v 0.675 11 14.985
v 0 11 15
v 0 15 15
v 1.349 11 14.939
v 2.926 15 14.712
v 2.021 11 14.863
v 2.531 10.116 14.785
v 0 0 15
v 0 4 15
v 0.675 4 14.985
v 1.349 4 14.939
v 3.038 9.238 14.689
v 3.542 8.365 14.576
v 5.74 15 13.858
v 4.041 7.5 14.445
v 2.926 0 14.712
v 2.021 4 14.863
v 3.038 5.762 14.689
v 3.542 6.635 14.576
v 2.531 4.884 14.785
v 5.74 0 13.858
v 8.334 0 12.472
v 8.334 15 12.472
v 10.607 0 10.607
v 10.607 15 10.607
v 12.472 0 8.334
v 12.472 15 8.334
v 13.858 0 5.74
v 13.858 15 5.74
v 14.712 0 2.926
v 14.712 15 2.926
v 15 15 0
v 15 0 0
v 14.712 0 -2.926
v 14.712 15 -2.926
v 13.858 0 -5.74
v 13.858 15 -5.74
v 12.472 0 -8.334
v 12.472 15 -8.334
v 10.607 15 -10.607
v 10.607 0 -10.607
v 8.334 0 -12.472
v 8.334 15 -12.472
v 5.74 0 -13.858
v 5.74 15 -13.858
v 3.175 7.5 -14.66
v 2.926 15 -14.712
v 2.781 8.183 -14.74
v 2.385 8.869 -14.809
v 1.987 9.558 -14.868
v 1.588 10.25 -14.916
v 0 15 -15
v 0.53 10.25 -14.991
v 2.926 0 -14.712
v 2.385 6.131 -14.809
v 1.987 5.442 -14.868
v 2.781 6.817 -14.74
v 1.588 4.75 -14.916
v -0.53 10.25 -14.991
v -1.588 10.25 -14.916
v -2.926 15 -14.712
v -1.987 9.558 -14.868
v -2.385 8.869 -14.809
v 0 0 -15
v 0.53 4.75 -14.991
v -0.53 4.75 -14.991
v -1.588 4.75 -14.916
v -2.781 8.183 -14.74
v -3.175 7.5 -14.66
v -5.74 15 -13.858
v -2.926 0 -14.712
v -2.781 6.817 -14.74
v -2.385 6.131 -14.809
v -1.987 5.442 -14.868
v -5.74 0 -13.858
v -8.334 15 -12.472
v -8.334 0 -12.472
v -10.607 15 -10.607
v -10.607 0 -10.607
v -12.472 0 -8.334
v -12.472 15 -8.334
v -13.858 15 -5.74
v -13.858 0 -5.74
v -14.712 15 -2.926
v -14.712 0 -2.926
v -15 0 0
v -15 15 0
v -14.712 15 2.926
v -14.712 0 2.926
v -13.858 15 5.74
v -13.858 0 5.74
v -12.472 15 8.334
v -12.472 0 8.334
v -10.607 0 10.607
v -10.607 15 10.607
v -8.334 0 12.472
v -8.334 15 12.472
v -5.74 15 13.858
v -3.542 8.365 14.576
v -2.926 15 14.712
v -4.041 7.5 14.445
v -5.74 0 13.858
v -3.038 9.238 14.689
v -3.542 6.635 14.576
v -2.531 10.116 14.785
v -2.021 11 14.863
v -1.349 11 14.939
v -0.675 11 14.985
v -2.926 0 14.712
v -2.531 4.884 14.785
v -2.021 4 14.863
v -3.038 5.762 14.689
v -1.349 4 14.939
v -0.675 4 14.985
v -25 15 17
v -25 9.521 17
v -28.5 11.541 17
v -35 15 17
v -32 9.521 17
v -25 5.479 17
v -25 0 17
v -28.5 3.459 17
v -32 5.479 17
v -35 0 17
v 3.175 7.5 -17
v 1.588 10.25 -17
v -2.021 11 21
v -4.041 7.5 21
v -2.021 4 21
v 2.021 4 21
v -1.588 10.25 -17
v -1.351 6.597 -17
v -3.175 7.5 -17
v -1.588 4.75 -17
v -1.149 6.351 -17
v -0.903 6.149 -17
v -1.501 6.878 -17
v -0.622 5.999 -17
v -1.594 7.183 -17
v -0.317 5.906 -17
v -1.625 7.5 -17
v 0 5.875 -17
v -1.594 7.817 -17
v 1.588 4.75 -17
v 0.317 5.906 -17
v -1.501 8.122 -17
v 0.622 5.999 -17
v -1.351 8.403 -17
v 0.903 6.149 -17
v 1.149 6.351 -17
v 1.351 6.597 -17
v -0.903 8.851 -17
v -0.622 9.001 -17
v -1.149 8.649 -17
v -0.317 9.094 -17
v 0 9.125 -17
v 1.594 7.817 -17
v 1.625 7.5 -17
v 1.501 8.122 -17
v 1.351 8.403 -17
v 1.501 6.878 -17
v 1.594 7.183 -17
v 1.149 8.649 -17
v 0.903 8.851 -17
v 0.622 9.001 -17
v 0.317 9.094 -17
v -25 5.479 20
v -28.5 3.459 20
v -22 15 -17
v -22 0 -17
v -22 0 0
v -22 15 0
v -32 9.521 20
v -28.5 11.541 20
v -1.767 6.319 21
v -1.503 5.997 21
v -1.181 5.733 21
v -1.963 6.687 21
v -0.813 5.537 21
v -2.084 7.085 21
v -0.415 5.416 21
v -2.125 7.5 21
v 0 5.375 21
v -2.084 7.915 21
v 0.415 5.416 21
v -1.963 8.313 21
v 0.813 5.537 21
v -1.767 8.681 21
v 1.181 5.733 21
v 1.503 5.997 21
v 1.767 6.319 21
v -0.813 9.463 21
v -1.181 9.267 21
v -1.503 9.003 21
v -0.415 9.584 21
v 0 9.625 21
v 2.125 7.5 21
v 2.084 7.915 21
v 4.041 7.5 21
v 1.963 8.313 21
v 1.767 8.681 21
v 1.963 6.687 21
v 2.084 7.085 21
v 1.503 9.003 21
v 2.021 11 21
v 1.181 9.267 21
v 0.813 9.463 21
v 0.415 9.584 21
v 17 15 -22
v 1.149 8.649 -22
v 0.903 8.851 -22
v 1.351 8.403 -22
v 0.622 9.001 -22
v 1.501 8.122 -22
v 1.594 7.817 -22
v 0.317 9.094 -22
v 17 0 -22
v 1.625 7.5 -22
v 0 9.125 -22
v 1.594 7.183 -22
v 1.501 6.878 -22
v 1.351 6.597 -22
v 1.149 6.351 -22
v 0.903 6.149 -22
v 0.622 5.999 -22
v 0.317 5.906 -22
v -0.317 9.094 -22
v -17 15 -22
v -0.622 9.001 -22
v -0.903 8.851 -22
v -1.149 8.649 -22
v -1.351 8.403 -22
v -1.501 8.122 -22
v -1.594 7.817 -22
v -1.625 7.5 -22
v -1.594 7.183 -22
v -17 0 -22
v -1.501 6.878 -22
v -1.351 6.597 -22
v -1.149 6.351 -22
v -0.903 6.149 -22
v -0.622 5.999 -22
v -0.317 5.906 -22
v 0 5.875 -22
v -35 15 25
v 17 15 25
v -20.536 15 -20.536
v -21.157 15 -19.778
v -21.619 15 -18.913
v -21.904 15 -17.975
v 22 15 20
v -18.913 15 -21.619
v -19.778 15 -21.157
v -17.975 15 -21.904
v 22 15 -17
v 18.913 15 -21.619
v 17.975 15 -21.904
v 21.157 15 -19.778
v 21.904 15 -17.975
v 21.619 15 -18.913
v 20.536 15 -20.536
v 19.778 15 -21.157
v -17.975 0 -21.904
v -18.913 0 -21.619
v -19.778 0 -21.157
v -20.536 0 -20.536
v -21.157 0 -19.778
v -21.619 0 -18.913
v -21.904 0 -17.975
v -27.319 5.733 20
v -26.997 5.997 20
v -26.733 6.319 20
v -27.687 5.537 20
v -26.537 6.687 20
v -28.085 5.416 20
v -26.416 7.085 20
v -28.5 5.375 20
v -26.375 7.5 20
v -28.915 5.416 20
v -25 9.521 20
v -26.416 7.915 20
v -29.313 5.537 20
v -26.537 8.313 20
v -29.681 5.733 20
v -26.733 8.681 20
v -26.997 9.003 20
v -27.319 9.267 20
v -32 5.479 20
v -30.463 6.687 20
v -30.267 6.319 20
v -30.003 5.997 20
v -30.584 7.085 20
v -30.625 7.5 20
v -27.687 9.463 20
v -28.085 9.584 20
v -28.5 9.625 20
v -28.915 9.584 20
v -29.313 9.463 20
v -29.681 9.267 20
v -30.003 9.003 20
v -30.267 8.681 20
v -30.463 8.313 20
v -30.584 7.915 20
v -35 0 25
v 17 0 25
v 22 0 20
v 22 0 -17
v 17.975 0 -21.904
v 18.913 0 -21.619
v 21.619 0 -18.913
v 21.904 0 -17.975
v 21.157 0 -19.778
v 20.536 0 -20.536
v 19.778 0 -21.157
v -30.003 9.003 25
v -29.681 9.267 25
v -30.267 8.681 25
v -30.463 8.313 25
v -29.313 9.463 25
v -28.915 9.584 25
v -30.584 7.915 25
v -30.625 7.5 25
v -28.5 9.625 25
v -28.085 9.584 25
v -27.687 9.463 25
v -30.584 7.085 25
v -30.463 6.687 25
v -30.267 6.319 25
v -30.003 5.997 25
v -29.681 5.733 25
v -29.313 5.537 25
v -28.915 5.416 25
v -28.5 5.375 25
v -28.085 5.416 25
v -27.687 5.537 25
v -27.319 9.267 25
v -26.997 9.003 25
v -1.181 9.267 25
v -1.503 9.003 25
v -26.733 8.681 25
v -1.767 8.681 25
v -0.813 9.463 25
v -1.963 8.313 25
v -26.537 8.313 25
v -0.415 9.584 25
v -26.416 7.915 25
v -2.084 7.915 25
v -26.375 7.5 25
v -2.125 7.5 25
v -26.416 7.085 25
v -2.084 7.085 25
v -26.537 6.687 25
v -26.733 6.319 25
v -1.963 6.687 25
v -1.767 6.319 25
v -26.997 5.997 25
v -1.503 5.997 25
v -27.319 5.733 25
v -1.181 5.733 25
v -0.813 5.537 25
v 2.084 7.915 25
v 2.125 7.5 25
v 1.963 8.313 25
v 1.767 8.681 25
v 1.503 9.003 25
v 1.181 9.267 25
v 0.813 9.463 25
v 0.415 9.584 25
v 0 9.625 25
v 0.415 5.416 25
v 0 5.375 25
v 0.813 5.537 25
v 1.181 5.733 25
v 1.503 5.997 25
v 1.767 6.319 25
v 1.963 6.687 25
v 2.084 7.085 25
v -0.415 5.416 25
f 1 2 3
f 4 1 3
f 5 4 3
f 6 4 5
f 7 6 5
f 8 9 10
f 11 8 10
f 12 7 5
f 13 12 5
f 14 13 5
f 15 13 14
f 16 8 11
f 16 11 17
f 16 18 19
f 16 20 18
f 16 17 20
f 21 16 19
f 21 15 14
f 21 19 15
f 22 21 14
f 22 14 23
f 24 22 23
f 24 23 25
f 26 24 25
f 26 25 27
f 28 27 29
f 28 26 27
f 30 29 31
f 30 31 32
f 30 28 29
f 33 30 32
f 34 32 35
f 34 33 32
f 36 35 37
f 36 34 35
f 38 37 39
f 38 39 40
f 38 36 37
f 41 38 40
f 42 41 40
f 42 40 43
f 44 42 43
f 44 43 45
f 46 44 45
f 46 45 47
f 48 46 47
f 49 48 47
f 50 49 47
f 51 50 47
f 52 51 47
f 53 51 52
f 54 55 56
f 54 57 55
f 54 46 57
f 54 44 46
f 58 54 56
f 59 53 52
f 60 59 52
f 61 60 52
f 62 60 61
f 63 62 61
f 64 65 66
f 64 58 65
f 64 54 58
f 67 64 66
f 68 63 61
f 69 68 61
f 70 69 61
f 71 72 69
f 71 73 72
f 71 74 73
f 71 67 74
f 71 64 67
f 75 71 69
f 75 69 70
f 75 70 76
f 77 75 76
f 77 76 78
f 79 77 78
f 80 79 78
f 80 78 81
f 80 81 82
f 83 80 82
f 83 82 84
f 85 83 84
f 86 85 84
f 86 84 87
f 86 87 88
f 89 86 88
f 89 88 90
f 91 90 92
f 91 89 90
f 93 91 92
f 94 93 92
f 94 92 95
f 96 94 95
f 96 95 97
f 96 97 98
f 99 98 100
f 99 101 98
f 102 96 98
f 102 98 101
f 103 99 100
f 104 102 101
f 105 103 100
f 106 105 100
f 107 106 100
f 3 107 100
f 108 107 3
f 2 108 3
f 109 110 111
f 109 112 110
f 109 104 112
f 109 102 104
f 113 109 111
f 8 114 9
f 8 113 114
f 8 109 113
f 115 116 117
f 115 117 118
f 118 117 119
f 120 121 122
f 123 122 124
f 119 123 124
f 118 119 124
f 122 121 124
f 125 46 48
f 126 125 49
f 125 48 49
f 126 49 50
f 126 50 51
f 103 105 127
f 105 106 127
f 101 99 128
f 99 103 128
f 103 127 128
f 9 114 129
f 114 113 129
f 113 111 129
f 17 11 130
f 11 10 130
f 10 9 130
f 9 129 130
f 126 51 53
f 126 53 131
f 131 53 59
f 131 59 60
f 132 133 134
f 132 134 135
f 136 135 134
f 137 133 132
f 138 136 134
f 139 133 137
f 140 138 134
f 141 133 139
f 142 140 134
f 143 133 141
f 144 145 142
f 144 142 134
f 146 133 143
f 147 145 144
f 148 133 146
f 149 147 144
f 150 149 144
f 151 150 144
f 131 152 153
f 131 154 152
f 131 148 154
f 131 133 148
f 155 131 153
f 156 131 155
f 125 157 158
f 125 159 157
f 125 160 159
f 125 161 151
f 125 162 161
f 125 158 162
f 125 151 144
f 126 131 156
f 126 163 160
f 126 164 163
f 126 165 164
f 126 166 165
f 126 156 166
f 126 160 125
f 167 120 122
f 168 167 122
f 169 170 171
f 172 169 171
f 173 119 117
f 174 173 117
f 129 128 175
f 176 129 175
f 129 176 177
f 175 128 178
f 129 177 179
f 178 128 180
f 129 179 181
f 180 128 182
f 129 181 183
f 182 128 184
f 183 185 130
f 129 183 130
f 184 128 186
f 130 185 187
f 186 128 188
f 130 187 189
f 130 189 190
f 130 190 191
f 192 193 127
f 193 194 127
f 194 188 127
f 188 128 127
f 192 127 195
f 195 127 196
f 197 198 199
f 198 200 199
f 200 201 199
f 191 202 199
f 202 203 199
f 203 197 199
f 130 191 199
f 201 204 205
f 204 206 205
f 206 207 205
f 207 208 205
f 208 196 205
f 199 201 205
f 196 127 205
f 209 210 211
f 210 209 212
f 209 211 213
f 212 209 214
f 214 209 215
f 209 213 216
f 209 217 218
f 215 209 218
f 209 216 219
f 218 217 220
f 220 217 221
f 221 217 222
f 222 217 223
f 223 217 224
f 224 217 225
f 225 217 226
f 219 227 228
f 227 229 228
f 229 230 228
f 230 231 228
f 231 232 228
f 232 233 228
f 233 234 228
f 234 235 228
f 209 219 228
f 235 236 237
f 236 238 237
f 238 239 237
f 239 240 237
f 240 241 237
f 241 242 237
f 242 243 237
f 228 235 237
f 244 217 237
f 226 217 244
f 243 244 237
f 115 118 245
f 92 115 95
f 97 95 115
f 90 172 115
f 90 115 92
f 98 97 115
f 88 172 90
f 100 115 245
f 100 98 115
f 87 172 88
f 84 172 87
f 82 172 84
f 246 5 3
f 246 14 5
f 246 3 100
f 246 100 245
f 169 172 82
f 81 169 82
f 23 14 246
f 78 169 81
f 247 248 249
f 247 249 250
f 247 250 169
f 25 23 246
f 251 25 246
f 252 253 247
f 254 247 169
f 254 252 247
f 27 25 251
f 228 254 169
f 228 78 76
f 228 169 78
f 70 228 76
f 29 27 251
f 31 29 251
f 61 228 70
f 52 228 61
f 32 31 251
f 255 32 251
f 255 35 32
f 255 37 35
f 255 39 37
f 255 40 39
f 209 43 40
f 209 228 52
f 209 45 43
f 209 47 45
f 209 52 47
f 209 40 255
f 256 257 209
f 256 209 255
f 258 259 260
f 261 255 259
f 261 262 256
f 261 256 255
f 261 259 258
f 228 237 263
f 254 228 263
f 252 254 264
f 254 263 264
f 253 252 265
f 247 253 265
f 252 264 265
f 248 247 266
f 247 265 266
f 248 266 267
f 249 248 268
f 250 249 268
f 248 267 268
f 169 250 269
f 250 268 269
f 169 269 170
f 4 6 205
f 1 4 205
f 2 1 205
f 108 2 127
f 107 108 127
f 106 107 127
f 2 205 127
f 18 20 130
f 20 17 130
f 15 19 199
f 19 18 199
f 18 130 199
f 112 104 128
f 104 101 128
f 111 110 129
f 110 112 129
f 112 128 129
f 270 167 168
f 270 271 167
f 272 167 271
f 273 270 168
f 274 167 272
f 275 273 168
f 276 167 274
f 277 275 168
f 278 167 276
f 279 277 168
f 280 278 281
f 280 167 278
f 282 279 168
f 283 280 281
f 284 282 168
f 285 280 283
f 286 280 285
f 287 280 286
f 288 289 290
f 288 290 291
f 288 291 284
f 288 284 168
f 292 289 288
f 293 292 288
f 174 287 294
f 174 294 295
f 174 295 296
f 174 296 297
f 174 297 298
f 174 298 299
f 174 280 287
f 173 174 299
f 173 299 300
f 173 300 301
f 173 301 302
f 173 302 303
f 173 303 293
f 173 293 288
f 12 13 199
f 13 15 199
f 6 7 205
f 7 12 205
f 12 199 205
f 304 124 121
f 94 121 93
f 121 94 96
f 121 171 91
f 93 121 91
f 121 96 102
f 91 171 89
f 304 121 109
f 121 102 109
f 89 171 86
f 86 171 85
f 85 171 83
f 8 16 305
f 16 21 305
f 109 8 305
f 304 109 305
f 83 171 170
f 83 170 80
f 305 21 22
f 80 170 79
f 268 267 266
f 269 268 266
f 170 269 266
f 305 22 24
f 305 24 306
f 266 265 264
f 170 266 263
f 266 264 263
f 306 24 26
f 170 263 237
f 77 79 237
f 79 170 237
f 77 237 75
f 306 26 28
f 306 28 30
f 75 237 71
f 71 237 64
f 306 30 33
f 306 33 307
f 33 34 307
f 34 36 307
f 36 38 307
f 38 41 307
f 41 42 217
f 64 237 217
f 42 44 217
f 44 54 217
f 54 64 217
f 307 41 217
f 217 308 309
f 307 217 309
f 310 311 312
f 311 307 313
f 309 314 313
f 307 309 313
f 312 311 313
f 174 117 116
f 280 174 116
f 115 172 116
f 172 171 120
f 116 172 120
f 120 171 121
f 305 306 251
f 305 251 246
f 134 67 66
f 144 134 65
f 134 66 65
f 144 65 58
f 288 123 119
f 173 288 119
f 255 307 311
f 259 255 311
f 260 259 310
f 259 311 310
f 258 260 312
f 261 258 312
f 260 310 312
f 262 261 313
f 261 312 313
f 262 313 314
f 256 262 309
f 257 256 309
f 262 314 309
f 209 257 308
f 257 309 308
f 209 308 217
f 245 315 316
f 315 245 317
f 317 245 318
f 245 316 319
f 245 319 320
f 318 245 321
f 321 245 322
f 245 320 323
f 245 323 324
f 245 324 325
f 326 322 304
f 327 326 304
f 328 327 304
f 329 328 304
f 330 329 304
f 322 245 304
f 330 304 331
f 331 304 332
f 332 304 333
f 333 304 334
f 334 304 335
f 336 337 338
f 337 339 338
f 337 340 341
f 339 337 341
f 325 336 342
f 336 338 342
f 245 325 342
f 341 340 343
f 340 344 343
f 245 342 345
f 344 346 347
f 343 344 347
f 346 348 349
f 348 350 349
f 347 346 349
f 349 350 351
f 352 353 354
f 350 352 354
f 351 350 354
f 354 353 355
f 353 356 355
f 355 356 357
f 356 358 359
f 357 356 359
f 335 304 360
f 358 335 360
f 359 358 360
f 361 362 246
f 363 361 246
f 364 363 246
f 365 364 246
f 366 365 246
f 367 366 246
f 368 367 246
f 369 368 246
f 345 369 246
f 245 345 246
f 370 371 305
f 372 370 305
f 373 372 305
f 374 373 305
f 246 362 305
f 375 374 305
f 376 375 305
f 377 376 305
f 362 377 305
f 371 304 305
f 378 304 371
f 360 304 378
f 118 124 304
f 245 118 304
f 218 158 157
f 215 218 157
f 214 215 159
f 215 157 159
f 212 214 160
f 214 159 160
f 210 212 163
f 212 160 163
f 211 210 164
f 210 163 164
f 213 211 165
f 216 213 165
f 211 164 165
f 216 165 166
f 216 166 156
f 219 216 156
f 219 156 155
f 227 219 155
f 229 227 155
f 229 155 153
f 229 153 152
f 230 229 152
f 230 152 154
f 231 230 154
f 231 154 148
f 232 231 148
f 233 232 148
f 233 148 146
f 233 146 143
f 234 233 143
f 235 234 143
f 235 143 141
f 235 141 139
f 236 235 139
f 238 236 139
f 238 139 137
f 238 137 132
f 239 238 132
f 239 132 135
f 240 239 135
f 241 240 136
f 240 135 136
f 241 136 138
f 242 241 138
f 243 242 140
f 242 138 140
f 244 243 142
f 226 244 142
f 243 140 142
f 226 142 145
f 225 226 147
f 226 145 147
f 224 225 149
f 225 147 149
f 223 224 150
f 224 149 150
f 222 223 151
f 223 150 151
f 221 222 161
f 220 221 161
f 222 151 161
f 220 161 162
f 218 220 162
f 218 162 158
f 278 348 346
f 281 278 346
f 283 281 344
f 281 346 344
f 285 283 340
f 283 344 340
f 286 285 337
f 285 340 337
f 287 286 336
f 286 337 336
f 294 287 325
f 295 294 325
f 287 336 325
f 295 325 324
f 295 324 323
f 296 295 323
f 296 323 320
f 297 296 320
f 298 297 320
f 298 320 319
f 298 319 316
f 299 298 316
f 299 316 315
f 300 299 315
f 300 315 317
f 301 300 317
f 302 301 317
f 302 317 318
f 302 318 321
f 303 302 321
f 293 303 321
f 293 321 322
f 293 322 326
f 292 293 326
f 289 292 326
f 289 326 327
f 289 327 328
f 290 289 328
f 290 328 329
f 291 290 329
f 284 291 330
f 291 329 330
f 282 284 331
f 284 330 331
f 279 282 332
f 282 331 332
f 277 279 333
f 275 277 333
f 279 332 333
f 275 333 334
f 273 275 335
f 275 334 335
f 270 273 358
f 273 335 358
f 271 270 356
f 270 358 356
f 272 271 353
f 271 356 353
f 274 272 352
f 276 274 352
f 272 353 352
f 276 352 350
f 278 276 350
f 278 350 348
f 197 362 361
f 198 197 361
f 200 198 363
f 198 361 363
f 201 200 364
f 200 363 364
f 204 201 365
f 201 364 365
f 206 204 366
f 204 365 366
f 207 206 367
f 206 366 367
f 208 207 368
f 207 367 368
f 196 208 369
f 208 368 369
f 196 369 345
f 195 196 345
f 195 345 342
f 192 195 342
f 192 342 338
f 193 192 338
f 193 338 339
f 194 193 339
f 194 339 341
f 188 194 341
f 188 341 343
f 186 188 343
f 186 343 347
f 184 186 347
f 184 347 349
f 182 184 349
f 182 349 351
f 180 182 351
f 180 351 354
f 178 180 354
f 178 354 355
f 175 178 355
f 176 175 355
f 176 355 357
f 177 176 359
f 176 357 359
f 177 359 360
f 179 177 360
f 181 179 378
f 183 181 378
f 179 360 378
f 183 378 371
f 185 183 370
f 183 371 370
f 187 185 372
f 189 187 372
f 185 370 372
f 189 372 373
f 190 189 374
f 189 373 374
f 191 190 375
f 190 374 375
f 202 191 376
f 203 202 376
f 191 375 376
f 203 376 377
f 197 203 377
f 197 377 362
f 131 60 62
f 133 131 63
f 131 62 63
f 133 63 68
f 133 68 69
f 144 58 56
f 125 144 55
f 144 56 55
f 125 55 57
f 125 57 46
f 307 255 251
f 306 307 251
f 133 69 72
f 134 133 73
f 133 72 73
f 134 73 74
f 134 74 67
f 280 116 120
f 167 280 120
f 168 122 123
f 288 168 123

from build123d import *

# Parameters (mm, degrees)
CROQUIS1_R              = 15
SALIENTE_EXTRUIR1_DEPTH = 15
CORTAR_EXTRUIR1_REACH   = 62.49
CROQUIS2_R              = 2.125
CORTAR_EXTRUIR2_DEPTH   = 3
CUT_EXTRUDE1_DEPTH      = 46.552167984
CUT_EXTRUDE2_REACH      = 66.49
CUT_EXTRUDE2_END_RADIUS = 15
CUT_EXTRUDE2_START      = -4
CUT_EXTRUDE3_START      = -39
CUT_EXTRUDE3_DEPTH      = 3
BOSS_EXTRUDE3_START     = -15
BOSS_EXTRUDE3_DEPTH     = 15
CUT_EXTRUDE4_START      = -20
SKETCH4_R               = 1.625
CUT_EXTRUDE4_DEPTH      = 41.489668539


with BuildPart() as part:
    # Croquis1 → Saliente-Extruir1 (new body)
    with BuildSketch(Plane(origin=(0, 0, 0), x_dir=(1, 0, 0), z_dir=(0, 1, 0))):
        with BuildLine():
            Line((-35, -17), (-35, -25))
            Line((-35, -25), (35, -25))
            Line((35, -25), (35, -17))
            Line((35, -17), (25, -17))
            Line((25, -17), (22, 0))
            ThreePointArc((22, 0), (0, 22), (-22, 0))
            Line((-22, 0), (-25, -17))
            Line((-25, -17), (-35, -17))
        make_face()
        with Locations(Location((0, 0, 0), (0, 0, 270))):
            Circle(CROQUIS1_R, mode=Mode.SUBTRACT)
    extrude(amount=SALIENTE_EXTRUIR1_DEPTH)

    # Croquis2 → Cortar-Extruir1 (cut, up to next)
    with BuildSketch(Plane.XY.offset(25), mode=Mode.PRIVATE) as cortar_extruir1_sk1:
        with Locations((-28.5, 7.5)):
            Circle(CROQUIS2_R)
    cortar_extruir1_tool1 = extrude(cortar_extruir1_sk1.sketch, amount=-CORTAR_EXTRUIR1_REACH, mode=Mode.PRIVATE) & part.part
    # Croquis2 → Cortar-Extruir1 (cut, up to next)
    with BuildSketch(Plane.XY.offset(25), mode=Mode.PRIVATE) as cortar_extruir1_sk2:
        with Locations((28.5, 7.5)):
            Circle(CROQUIS2_R)
    cortar_extruir1_tool2 = extrude(cortar_extruir1_sk2.sketch, amount=-CORTAR_EXTRUIR1_REACH, mode=Mode.PRIVATE) & part.part
    # Croquis2 → Cortar-Extruir1 (cut, up to next)
    with BuildSketch(Plane.XY.offset(25), mode=Mode.PRIVATE) as cortar_extruir1_sk3:
        with Locations((0, 7.5)):
            Circle(CROQUIS2_R)
    cortar_extruir1_tool3 = extrude(cortar_extruir1_sk3.sketch, amount=-CORTAR_EXTRUIR1_REACH, mode=Mode.PRIVATE) & part.part
    add(cortar_extruir1_tool1.solids().sort_by_distance((-28.5, 7.5, 25))[0], mode=Mode.SUBTRACT)
    add(cortar_extruir1_tool2.solids().sort_by_distance((28.5, 7.5, 25))[0], mode=Mode.SUBTRACT)
    add(cortar_extruir1_tool3.solids().sort_by_distance((0, 7.5, 25))[0], mode=Mode.SUBTRACT)

    # Croquis3 → Cortar-Extruir2 (cut)
    with BuildSketch(Plane(origin=(0, 0, 17), x_dir=(-1, 0, 0), z_dir=(0, 0, -1))):
        Polygon((25, 5.479274058), (28.5, 3.458548116), (32, 5.479274058), (32, 9.520725942), (28.5, 11.541451884), (25, 9.520725942), align=None)
        Polygon((-25, 5.479274058), (-25, 9.520725942), (-28.5, 11.541451884), (-32, 9.520725942), (-32, 5.479274058), (-28.5, 3.458548116), align=None)
    extrude(amount=-CORTAR_EXTRUIR2_DEPTH, mode=Mode.SUBTRACT)

    # Sketch1 → Cut-Extrude1 (cut, through all)
    with BuildSketch(Plane(origin=(0, 15, 0), x_dir=(1, 0, 0), z_dir=(0, 1, 0))):
        Polygon((22, -25), (22, -20), (17, -25), align=None)
        Polygon((22, 0), (22, -20), (22, -25), (35, -25), (35, -17), (25, -17), align=None)
    extrude(amount=-CUT_EXTRUDE1_DEPTH, mode=Mode.SUBTRACT)

    # Cut-Extrude2: up to this cylinder (the profile starts outside it)
    cut_extrude2_end = Plane(origin=(0, 7.5, 0), z_dir=(0, -1, 0)) * Cylinder(CUT_EXTRUDE2_END_RADIUS, 163.98, mode=Mode.PRIVATE)
    # Sketch2 → Cut-Extrude2 (cut, up to the surface)
    with BuildSketch(Plane.XY.offset(25).offset(CUT_EXTRUDE2_START), mode=Mode.PRIVATE) as cut_extrude2_sk1:
        Polygon((2.020725942, 4), (4.041451884, 7.5), (2.020725942, 11), (-2.020725942, 11), (-4.041451884, 7.5), (-2.020725942, 4), align=None)
    cut_extrude2_tool1 = extrude(cut_extrude2_sk1.sketch, amount=-CUT_EXTRUDE2_REACH, mode=Mode.PRIVATE) - cut_extrude2_end
    add(cut_extrude2_tool1.solids().sort_by_distance((0, 7.5, 21))[0], mode=Mode.SUBTRACT)

    # Sketch3 → Cut-Extrude3 (cut)
    with BuildSketch(Plane.XY.offset(25).offset(CUT_EXTRUDE3_START)):
        Polygon((1.58771324, 4.75), (3.175426481, 7.5), (1.58771324, 10.25), (-1.58771324, 10.25), (-3.175426481, 7.5), (-1.58771324, 4.75), align=None)
    extrude(amount=-CUT_EXTRUDE3_DEPTH, mode=Mode.SUBTRACT)

    # Sketch5 → Boss-Extrude3 (add)
    with BuildSketch(Plane(origin=(0, 15, 0), x_dir=(1, 0, 0), z_dir=(0, 1, 0)).offset(BOSS_EXTRUDE3_START)):
        with BuildLine():
            ThreePointArc((-12.177948568, 18.322051432), (-6.36061571, 21.060450323), (3.35e-07, 22))
            Line((3.35e-07, 22), (-17, 22))
            ThreePointArc((-17, 22), (-13.967695362, 20.975566448), (-12.177948568, 18.322051432))
        make_face()
        with BuildLine():
            ThreePointArc((12.177948568, 18.322051432), (13.967695362, 20.975566448), (17, 22))
            Line((17, 22), (3.35e-07, 22))
            ThreePointArc((3.35e-07, 22), (6.360616031, 21.060450226), (12.177948568, 18.322051432))
        make_face()
        with BuildLine():
            ThreePointArc((18.322051432, 12.177948568), (20.975566448, 13.967695362), (22, 17))
            ThreePointArc((22, 17), (20.535533906, 20.535533906), (17, 22))
            ThreePointArc((17, 22), (13.967695362, 20.975566448), (12.177948568, 18.322051432))
            ThreePointArc((12.177948568, 18.322051432), (15.556349186, 15.556349186), (18.322051432, 12.177948568))
        make_face()
        with BuildLine():
            ThreePointArc((12.177948568, 18.322051432), (13.464466094, 13.464466094), (18.322051432, 12.177948568))
            ThreePointArc((18.322051432, 12.177948568), (15.556349186, 15.556349186), (12.177948568, 18.322051432))
        make_face()
        with BuildLine():
            ThreePointArc((18.322051432, 12.177948568), (21.060450274, 6.36061587), (22, 0))
            Line((22, 0), (22, 17))
            ThreePointArc((22, 17), (20.975566448, 13.967695362), (18.322051432, 12.177948568))
        make_face()
        with BuildLine():
            ThreePointArc((-17, 22), (-20.535533906, 20.535533906), (-22, 17))
            ThreePointArc((-22, 17), (-20.975566448, 13.967695362), (-18.322051432, 12.177948568))
            ThreePointArc((-18.322051432, 12.177948568), (-15.556349186, 15.556349186), (-12.177948568, 18.322051432))
            ThreePointArc((-12.177948568, 18.322051432), (-13.967695362, 20.975566448), (-17, 22))
        make_face()
        with BuildLine():
            ThreePointArc((-12.177948568, 18.322051432), (-15.556349186, 15.556349186), (-18.322051432, 12.177948568))
            ThreePointArc((-18.322051432, 12.177948568), (-13.967695362, 13.024433552), (-12, 17))
            ThreePointArc((-12, 17), (-12.044686833, 17.666986822), (-12.177948568, 18.322051432))
        make_face()
        with BuildLine():
            Line((-22, 17), (-22, 0))
            ThreePointArc((-22, 0), (-21.060450274, 6.36061587), (-18.322051432, 12.177948568))
            ThreePointArc((-18.322051432, 12.177948568), (-20.975566448, 13.967695362), (-22, 17))
        make_face()
    extrude(amount=BOSS_EXTRUDE3_DEPTH)

    # Sketch4 → Cut-Extrude4 (cut, through all)
    with BuildSketch(Plane.XY.offset(25).offset(CUT_EXTRUDE4_START)):
        with Locations((0, 7.5)):
            Circle(SKETCH4_R)
    extrude(amount=-CUT_EXTRUDE4_DEPTH, mode=Mode.SUBTRACT)


solid = part.part
